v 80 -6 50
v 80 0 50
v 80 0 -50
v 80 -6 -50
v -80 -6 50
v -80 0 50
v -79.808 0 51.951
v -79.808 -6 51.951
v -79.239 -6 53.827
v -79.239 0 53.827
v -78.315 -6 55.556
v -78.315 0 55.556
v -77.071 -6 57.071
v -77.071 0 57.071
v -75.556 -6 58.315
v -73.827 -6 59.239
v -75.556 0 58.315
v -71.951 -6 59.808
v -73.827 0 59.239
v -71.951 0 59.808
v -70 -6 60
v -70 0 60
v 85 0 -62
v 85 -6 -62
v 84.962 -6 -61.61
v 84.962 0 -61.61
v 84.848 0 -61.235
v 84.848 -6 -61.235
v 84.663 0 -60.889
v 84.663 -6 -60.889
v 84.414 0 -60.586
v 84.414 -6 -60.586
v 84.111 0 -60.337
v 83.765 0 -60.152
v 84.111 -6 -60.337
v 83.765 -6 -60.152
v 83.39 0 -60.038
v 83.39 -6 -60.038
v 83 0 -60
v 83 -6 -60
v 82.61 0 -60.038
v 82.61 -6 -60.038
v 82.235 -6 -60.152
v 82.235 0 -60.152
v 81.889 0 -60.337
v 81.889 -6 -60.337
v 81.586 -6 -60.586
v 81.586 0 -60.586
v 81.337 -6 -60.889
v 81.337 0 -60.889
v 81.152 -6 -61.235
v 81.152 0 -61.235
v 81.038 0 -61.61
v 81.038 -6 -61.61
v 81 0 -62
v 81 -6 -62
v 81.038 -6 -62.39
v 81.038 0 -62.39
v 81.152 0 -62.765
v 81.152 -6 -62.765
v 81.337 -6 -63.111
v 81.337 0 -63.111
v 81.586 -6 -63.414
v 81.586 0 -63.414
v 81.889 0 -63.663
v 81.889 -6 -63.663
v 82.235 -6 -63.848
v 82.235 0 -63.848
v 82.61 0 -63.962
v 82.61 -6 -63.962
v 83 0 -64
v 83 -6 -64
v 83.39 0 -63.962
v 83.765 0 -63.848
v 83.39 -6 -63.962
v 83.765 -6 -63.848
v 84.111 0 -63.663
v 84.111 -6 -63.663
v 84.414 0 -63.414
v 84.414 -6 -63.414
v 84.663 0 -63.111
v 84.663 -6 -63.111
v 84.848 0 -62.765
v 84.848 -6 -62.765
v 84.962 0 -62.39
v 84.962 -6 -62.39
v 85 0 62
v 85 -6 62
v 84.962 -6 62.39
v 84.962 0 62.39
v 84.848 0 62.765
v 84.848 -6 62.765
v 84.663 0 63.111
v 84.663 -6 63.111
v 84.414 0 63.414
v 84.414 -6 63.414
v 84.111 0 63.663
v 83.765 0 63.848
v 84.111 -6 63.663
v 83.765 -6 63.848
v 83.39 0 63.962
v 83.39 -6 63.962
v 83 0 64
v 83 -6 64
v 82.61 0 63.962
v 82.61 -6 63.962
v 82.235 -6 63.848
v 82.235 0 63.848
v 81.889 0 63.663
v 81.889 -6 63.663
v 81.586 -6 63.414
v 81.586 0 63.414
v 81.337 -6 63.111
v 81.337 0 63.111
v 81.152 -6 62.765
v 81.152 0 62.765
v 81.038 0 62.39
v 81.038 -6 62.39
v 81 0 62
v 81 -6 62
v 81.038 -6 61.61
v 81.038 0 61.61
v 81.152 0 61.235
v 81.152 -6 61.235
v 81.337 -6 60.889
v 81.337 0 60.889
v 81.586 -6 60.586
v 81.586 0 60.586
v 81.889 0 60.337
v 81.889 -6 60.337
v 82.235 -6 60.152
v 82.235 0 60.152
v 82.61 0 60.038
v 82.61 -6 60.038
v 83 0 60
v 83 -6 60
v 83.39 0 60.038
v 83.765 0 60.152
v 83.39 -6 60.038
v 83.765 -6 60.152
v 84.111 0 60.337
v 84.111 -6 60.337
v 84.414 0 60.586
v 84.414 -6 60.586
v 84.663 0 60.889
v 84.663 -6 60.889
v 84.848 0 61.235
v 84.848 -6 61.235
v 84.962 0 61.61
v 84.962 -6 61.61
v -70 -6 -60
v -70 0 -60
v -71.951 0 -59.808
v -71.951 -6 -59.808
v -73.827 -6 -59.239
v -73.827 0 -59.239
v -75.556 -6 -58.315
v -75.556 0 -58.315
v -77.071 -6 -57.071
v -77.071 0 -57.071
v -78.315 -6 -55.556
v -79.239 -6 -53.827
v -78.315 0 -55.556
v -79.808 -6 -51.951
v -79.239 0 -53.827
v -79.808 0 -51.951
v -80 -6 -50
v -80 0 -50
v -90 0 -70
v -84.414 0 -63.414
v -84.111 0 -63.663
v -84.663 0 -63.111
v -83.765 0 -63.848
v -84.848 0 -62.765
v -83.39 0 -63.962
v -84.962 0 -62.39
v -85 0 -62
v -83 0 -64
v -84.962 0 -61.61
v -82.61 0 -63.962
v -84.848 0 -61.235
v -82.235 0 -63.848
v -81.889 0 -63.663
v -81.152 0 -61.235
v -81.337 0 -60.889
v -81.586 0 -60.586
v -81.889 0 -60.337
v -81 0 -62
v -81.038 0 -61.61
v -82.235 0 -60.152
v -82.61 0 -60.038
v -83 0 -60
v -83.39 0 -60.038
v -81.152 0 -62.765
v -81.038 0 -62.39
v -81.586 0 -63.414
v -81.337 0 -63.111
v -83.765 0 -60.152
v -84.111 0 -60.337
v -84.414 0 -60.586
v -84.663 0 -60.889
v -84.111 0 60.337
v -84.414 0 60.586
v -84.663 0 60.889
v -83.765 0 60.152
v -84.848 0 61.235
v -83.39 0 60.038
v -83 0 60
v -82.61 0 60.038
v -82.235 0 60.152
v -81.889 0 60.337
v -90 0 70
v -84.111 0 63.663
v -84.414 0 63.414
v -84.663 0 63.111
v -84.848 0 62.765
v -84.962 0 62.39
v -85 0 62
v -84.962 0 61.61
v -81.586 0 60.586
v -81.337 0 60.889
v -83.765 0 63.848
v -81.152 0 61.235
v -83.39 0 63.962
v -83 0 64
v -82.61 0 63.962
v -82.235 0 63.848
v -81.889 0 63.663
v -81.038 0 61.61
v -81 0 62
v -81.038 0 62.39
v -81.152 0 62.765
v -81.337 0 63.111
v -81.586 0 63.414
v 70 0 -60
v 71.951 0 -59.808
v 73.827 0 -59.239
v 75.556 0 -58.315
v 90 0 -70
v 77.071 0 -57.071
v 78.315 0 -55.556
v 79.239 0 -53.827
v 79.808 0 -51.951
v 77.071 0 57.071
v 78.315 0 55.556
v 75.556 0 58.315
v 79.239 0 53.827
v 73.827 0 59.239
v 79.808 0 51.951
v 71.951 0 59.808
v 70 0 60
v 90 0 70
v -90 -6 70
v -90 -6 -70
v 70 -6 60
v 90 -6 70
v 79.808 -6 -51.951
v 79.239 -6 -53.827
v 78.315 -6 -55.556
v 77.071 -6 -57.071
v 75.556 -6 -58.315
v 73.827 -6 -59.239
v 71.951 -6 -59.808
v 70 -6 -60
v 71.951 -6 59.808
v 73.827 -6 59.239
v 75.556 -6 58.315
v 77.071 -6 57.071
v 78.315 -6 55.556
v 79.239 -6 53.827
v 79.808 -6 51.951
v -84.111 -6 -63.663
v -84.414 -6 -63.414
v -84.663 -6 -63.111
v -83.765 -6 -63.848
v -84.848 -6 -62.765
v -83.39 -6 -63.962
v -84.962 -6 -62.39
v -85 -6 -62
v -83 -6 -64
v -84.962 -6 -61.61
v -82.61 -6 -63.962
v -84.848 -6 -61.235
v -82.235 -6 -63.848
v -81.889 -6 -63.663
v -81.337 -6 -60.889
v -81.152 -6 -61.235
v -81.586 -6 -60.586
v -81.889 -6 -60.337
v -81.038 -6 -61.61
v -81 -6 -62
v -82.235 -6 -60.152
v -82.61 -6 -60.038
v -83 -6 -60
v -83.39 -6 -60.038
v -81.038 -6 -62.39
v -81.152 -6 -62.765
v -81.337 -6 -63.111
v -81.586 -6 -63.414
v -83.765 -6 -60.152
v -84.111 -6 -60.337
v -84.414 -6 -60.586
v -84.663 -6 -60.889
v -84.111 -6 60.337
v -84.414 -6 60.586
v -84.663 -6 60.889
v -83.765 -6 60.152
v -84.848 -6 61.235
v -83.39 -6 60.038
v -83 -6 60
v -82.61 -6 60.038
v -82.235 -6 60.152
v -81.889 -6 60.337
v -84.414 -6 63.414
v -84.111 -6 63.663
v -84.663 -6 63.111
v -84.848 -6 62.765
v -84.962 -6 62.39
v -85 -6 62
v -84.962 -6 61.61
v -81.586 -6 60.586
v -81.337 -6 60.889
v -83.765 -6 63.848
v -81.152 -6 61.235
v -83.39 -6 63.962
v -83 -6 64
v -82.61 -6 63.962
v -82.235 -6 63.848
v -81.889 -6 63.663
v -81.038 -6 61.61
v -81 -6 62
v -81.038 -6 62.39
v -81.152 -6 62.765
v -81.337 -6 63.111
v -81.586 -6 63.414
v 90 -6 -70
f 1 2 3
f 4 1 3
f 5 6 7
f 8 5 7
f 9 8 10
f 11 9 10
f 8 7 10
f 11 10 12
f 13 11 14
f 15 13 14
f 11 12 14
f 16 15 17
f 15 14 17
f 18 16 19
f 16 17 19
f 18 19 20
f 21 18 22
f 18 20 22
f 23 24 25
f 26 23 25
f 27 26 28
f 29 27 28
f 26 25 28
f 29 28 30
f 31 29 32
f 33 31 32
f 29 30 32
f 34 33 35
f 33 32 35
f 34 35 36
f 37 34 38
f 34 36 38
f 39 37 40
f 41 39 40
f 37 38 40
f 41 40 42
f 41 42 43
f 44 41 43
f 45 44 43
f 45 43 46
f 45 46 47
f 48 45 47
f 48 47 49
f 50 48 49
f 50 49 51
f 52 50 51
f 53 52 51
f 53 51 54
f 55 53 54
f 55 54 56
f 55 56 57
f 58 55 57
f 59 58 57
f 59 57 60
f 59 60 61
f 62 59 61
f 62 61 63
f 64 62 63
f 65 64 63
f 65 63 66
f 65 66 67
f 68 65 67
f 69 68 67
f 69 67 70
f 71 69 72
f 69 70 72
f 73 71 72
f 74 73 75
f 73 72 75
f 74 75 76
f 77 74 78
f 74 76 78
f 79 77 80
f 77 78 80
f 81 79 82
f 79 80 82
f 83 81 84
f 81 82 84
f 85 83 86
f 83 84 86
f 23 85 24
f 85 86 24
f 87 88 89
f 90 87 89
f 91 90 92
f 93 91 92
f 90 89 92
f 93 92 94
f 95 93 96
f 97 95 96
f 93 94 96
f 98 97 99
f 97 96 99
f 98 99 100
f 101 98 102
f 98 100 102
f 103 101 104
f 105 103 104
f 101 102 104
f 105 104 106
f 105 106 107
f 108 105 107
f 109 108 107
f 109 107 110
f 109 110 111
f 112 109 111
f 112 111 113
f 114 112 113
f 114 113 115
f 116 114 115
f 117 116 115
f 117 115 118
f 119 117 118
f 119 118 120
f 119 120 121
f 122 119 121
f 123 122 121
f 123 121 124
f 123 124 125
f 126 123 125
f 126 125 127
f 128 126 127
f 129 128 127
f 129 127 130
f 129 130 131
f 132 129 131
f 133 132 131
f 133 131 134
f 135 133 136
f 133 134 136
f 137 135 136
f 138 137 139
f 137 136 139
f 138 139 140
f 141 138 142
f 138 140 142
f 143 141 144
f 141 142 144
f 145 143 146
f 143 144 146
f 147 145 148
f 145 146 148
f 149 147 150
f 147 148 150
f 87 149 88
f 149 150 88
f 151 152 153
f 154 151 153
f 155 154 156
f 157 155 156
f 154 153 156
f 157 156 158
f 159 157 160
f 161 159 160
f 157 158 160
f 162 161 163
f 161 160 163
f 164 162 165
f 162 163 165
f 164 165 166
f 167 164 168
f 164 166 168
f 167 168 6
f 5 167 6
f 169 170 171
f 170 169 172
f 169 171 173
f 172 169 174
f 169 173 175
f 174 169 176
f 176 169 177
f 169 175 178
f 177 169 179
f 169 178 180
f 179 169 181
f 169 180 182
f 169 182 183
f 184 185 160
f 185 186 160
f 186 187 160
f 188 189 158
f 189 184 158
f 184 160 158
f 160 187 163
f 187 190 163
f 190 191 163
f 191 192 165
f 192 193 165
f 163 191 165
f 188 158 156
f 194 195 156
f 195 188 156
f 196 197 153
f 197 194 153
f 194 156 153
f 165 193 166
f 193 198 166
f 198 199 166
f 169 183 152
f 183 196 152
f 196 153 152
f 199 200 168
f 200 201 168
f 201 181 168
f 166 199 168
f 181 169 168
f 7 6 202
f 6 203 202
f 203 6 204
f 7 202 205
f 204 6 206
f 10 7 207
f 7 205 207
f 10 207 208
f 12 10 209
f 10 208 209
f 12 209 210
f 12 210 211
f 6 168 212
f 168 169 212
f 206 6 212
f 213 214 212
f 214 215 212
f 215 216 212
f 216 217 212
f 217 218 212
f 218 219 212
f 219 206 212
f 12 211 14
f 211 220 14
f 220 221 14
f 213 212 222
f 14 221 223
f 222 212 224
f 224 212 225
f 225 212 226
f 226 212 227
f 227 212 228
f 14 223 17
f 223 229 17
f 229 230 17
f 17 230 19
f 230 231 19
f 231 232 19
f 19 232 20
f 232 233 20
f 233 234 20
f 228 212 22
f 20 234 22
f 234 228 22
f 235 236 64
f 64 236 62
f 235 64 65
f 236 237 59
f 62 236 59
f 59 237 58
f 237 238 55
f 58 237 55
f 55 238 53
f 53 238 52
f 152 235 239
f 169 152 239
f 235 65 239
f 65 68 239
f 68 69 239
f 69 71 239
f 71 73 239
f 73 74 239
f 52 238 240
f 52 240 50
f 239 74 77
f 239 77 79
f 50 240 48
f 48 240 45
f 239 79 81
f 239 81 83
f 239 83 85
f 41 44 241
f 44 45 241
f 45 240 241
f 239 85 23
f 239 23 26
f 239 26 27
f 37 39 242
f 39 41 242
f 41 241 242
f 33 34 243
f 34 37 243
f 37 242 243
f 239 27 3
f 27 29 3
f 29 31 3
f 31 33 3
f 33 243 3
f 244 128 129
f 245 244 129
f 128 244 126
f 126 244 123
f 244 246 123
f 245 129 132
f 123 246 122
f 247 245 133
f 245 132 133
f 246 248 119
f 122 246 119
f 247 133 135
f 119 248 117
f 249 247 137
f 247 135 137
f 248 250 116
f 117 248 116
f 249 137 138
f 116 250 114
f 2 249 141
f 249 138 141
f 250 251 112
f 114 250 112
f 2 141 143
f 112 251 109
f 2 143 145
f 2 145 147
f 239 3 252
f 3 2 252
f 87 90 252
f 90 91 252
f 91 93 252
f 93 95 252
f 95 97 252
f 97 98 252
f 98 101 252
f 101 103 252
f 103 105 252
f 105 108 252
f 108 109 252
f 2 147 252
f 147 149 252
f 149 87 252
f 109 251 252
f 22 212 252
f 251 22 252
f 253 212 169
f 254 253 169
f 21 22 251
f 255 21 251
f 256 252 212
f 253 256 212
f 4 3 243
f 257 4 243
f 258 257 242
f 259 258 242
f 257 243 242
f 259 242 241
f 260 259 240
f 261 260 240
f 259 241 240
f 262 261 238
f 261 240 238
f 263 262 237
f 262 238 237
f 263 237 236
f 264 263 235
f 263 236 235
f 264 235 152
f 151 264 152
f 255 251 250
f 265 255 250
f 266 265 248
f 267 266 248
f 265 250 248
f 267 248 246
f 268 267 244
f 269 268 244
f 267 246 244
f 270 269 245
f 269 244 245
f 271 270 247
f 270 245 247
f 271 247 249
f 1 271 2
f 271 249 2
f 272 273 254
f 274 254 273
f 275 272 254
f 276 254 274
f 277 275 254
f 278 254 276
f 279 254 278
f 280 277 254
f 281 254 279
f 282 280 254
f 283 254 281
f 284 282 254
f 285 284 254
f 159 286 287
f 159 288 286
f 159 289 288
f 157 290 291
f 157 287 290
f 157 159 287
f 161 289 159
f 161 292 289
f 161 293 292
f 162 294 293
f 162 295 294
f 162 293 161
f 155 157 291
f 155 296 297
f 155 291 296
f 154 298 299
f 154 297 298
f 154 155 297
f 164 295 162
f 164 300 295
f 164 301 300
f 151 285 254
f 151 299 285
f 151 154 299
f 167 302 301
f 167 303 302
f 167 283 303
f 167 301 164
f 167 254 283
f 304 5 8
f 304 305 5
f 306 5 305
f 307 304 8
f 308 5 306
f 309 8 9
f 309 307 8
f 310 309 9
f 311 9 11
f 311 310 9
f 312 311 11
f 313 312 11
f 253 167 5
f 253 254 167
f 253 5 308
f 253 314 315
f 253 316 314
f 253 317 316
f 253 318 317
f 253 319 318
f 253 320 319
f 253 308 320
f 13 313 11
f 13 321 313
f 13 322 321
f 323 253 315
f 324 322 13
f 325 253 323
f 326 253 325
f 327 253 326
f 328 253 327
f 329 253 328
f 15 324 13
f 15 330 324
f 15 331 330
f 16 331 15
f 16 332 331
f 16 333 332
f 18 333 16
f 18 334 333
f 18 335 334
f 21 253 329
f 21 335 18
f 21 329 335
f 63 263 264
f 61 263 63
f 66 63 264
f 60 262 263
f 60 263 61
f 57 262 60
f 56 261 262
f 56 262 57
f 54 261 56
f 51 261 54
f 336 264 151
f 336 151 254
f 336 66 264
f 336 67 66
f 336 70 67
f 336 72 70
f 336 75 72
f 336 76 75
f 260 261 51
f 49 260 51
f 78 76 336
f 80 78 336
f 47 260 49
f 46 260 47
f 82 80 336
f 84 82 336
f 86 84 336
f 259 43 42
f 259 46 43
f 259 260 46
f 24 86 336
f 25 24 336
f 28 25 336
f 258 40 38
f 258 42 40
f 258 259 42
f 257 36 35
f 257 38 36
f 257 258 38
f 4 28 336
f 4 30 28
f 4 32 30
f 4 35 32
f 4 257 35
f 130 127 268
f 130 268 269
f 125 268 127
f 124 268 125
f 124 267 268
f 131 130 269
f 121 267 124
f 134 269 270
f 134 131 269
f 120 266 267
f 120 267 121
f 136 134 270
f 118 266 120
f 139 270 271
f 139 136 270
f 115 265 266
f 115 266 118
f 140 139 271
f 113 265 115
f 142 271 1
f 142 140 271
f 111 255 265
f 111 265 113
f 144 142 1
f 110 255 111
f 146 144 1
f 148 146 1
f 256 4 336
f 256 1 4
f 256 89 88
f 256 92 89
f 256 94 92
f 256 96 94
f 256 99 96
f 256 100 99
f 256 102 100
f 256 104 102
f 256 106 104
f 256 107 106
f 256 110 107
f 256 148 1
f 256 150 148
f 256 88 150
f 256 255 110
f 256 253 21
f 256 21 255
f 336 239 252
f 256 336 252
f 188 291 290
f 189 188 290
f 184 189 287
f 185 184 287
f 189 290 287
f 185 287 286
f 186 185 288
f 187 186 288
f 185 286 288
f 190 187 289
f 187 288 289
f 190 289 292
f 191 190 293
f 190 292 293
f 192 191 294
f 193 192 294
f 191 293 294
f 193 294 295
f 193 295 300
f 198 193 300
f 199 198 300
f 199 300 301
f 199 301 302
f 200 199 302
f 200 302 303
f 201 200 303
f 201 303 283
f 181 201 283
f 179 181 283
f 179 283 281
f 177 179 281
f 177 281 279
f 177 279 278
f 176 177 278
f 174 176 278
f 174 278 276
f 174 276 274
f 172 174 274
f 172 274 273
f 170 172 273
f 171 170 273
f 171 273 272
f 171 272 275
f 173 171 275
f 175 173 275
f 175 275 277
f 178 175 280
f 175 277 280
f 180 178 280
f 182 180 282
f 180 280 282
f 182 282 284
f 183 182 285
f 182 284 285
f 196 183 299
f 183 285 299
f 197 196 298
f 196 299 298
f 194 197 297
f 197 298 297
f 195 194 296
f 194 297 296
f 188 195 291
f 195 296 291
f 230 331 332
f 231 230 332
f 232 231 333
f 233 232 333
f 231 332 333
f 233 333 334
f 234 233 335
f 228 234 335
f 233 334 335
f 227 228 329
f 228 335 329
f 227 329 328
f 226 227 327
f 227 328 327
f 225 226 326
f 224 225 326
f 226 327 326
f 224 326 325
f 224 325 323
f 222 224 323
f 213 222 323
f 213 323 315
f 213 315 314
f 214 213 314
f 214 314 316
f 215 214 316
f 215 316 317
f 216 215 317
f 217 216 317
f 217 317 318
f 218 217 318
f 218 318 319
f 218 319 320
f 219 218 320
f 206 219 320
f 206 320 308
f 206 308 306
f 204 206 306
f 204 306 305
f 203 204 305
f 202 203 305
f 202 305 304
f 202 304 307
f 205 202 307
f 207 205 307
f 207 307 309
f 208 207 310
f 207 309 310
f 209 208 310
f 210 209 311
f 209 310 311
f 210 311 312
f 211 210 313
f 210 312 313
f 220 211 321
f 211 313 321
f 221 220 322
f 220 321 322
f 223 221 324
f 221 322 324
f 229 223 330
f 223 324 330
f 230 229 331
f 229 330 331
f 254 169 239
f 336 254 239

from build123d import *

# Parameters (mm, degrees)
F1_DEPTH = 6
F2_R     = 2
F3_DEPTH = 25


with BuildPart() as f1:
    # F0 (on Front) → F1 (new body)
    with BuildSketch(Plane.XZ):
        with BuildLine():
            Line((-90, 70), (-90, -70))
            Line((-90, -70), (90, -70))
            Line((90, -70), (90, 0))
            Line((90, 0), (80, 0))
            Line((80, 0), (80, -50))
            ThreePointArc((80, -50), (77.071068, -57.071068), (70, -60))
            Line((70, -60), (-70, -60))
            ThreePointArc((-70, -60), (-77.071068, -57.071068), (-80, -50))
            Line((-80, -50), (-80, 50))
            ThreePointArc((-80, 50), (-77.071068, 57.071068), (-70, 60))
            Line((-70, 60), (0, 60))
            Line((0, 60), (0, 70))
            Line((0, 70), (-90, 70))
        make_face()
        with BuildLine():
            Line((80, 0), (90, 0))
            Line((90, 0), (90, 70))
            Line((90, 70), (0, 70))
            Line((0, 70), (0, 60))
            Line((0, 60), (70, 60))
            ThreePointArc((70, 60), (77.071068, 57.071068), (80, 50))
            Line((80, 50), (80, 0))
        make_face()
    extrude(amount=F1_DEPTH)

    # F2 (on face) → F3 (cut)
    with BuildSketch(Plane.XZ.offset(6)):
        with Locations((-83, 62)):
            Circle(F2_R)
        with Locations((-83, -62)):
            Circle(F2_R)
        with Locations((83, -62)):
            Circle(F2_R)
        with Locations((83, 62)):
            Circle(F2_R)
    extrude(amount=-F3_DEPTH, mode=Mode.SUBTRACT)


solid = f1.part
